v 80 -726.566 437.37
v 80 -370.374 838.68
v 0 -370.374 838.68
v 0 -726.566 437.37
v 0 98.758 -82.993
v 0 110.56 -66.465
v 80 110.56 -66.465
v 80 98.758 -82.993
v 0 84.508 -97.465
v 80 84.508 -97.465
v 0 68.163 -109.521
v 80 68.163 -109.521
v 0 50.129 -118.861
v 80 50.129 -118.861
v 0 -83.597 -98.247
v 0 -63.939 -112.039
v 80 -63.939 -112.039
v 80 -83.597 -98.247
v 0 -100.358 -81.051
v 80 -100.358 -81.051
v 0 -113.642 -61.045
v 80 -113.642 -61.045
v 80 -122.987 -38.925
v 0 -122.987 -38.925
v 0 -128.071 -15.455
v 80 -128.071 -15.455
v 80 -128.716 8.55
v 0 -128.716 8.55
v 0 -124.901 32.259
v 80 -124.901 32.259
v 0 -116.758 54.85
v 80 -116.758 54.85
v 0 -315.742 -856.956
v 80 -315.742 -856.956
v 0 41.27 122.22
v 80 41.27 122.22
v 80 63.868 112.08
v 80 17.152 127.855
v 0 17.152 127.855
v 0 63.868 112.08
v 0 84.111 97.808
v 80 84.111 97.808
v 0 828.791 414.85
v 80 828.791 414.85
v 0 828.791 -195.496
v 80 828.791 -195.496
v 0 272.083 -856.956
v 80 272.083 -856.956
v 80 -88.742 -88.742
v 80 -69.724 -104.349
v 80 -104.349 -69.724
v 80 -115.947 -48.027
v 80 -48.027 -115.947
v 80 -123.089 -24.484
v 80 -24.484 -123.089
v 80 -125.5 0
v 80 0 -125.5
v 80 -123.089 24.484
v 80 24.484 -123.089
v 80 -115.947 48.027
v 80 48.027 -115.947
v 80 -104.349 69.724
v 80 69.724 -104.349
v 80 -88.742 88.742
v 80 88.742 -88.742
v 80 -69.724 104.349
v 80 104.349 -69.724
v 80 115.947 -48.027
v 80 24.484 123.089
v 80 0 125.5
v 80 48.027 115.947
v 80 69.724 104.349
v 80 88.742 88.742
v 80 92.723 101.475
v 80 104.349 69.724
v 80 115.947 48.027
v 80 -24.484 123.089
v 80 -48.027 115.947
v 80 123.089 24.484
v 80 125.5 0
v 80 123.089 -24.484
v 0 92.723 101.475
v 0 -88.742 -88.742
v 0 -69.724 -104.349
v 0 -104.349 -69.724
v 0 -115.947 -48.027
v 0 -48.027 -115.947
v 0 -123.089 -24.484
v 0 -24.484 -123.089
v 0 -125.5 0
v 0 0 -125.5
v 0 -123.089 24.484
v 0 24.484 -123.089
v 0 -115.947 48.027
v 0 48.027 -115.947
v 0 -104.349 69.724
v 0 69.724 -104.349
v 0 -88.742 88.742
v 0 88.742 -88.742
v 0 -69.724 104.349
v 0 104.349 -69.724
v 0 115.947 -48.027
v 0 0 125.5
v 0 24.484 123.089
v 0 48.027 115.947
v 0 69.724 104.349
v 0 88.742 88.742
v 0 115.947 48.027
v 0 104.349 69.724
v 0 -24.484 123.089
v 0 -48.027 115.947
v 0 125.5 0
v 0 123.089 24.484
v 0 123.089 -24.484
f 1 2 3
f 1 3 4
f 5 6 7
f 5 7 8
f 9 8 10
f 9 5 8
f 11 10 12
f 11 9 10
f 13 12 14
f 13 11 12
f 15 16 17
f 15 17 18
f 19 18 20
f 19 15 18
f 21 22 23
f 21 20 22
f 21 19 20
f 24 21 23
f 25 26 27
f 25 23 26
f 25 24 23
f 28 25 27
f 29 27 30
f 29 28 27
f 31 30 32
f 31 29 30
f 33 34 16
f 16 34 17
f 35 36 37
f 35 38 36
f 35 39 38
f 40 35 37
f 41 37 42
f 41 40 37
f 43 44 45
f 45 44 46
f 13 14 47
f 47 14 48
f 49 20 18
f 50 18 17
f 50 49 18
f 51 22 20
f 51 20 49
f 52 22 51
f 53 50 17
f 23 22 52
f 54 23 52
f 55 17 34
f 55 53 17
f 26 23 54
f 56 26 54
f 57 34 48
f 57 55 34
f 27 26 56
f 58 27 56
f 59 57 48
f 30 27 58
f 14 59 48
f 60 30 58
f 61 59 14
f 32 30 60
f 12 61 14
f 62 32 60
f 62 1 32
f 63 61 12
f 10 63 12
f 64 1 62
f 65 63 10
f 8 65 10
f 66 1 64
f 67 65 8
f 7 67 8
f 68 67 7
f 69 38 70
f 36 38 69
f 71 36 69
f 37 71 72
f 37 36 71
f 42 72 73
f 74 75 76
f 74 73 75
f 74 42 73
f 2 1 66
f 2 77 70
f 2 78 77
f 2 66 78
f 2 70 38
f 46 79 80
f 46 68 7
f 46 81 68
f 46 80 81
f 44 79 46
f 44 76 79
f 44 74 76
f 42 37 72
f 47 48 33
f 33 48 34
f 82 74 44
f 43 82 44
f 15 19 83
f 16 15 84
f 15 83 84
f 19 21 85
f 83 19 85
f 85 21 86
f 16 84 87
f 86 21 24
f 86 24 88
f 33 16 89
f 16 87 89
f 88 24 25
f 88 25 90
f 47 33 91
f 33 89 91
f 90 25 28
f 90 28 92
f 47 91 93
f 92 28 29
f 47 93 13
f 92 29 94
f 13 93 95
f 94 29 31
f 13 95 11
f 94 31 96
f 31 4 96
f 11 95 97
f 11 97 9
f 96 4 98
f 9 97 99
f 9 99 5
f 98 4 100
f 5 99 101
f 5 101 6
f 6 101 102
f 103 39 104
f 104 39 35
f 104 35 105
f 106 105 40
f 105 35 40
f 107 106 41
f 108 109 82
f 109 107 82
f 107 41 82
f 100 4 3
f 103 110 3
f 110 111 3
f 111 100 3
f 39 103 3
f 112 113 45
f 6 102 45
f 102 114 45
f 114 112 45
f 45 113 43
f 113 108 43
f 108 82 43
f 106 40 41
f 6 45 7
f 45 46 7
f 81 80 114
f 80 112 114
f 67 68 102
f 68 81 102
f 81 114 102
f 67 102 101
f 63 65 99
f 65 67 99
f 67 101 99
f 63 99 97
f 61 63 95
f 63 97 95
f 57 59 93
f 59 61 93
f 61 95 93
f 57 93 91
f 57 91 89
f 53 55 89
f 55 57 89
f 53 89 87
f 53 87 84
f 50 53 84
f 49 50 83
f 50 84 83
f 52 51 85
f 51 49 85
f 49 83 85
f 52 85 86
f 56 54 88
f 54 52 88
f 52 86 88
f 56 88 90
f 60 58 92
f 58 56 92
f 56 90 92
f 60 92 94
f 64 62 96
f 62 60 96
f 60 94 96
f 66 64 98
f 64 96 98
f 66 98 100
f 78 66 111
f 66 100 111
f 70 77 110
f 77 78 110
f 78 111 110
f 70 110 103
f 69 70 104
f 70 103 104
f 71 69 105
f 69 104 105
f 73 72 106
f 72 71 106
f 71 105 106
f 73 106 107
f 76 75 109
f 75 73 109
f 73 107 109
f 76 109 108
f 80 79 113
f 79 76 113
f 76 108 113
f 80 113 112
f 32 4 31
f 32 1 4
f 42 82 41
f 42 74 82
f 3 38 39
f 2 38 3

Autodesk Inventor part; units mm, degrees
ref_plane "YZ Plane" through (0, 0, 0) normal (1, 0, 0) x (0, 1, 0)
ref_plane "XZ Plane" through (0, 0, 0) normal (0, 1, 0) x (-1, 0, 0)
ref_plane "XY Plane" through (0, 0, 0) normal (0, 0, 1) x (1, 0, 0)
sketch "Sketch1" plane through (0, 0, 0) normal (1, 0, 0) x (0, 1, 0)
  circle A0 centre (0, 0) radius 129
  circle A1 centre (0, 0) radius 125.5
  dimension "d0" = 258
  dimension "d1" = 251
extrude "Extrusion1" add sketch "Sketch1" along normal blind 80
sketch "Sketch2" plane through (80, 0, 0) normal (1, 0, 0) x (0, 0, -1)
  line L0 (-101.4747, 92.723) -> (-414.8501, 828.7908)
  line L1 (-414.8501, 828.7908) -> (195.4959, 828.7908)
  line L2 (195.4959, 828.7908) -> (66.4648, 110.5596)
  circle A0 centre (0, 0) radius 129 projected
  line L3 (-101.4747, 92.723) -> (-97.8081, 84.1106)
  line L4 (118.8614, 50.1294) -> (856.9556, 272.0827)
  line L5 (856.9556, 272.0827) -> (856.9556, -315.7415)
  line L6 (856.9556, -315.7415) -> (112.0393, -63.9391)
  line L7 (-127.8547, 17.1518) -> (-838.6795, -370.3737)
  line L8 (-838.6795, -370.3737) -> (-437.3695, -726.566)
  line L9 (-437.3695, -726.566) -> (-54.85, -116.7582)
  dimension "d4" = 800
extrude "Extrusion2" add sketch "Sketch2" against normal blind 80 contours L0 L1 L2 A0 L3 | A0 L9 L8 L7 | L4 L5 L6 A0
properties part number "fan blade"
